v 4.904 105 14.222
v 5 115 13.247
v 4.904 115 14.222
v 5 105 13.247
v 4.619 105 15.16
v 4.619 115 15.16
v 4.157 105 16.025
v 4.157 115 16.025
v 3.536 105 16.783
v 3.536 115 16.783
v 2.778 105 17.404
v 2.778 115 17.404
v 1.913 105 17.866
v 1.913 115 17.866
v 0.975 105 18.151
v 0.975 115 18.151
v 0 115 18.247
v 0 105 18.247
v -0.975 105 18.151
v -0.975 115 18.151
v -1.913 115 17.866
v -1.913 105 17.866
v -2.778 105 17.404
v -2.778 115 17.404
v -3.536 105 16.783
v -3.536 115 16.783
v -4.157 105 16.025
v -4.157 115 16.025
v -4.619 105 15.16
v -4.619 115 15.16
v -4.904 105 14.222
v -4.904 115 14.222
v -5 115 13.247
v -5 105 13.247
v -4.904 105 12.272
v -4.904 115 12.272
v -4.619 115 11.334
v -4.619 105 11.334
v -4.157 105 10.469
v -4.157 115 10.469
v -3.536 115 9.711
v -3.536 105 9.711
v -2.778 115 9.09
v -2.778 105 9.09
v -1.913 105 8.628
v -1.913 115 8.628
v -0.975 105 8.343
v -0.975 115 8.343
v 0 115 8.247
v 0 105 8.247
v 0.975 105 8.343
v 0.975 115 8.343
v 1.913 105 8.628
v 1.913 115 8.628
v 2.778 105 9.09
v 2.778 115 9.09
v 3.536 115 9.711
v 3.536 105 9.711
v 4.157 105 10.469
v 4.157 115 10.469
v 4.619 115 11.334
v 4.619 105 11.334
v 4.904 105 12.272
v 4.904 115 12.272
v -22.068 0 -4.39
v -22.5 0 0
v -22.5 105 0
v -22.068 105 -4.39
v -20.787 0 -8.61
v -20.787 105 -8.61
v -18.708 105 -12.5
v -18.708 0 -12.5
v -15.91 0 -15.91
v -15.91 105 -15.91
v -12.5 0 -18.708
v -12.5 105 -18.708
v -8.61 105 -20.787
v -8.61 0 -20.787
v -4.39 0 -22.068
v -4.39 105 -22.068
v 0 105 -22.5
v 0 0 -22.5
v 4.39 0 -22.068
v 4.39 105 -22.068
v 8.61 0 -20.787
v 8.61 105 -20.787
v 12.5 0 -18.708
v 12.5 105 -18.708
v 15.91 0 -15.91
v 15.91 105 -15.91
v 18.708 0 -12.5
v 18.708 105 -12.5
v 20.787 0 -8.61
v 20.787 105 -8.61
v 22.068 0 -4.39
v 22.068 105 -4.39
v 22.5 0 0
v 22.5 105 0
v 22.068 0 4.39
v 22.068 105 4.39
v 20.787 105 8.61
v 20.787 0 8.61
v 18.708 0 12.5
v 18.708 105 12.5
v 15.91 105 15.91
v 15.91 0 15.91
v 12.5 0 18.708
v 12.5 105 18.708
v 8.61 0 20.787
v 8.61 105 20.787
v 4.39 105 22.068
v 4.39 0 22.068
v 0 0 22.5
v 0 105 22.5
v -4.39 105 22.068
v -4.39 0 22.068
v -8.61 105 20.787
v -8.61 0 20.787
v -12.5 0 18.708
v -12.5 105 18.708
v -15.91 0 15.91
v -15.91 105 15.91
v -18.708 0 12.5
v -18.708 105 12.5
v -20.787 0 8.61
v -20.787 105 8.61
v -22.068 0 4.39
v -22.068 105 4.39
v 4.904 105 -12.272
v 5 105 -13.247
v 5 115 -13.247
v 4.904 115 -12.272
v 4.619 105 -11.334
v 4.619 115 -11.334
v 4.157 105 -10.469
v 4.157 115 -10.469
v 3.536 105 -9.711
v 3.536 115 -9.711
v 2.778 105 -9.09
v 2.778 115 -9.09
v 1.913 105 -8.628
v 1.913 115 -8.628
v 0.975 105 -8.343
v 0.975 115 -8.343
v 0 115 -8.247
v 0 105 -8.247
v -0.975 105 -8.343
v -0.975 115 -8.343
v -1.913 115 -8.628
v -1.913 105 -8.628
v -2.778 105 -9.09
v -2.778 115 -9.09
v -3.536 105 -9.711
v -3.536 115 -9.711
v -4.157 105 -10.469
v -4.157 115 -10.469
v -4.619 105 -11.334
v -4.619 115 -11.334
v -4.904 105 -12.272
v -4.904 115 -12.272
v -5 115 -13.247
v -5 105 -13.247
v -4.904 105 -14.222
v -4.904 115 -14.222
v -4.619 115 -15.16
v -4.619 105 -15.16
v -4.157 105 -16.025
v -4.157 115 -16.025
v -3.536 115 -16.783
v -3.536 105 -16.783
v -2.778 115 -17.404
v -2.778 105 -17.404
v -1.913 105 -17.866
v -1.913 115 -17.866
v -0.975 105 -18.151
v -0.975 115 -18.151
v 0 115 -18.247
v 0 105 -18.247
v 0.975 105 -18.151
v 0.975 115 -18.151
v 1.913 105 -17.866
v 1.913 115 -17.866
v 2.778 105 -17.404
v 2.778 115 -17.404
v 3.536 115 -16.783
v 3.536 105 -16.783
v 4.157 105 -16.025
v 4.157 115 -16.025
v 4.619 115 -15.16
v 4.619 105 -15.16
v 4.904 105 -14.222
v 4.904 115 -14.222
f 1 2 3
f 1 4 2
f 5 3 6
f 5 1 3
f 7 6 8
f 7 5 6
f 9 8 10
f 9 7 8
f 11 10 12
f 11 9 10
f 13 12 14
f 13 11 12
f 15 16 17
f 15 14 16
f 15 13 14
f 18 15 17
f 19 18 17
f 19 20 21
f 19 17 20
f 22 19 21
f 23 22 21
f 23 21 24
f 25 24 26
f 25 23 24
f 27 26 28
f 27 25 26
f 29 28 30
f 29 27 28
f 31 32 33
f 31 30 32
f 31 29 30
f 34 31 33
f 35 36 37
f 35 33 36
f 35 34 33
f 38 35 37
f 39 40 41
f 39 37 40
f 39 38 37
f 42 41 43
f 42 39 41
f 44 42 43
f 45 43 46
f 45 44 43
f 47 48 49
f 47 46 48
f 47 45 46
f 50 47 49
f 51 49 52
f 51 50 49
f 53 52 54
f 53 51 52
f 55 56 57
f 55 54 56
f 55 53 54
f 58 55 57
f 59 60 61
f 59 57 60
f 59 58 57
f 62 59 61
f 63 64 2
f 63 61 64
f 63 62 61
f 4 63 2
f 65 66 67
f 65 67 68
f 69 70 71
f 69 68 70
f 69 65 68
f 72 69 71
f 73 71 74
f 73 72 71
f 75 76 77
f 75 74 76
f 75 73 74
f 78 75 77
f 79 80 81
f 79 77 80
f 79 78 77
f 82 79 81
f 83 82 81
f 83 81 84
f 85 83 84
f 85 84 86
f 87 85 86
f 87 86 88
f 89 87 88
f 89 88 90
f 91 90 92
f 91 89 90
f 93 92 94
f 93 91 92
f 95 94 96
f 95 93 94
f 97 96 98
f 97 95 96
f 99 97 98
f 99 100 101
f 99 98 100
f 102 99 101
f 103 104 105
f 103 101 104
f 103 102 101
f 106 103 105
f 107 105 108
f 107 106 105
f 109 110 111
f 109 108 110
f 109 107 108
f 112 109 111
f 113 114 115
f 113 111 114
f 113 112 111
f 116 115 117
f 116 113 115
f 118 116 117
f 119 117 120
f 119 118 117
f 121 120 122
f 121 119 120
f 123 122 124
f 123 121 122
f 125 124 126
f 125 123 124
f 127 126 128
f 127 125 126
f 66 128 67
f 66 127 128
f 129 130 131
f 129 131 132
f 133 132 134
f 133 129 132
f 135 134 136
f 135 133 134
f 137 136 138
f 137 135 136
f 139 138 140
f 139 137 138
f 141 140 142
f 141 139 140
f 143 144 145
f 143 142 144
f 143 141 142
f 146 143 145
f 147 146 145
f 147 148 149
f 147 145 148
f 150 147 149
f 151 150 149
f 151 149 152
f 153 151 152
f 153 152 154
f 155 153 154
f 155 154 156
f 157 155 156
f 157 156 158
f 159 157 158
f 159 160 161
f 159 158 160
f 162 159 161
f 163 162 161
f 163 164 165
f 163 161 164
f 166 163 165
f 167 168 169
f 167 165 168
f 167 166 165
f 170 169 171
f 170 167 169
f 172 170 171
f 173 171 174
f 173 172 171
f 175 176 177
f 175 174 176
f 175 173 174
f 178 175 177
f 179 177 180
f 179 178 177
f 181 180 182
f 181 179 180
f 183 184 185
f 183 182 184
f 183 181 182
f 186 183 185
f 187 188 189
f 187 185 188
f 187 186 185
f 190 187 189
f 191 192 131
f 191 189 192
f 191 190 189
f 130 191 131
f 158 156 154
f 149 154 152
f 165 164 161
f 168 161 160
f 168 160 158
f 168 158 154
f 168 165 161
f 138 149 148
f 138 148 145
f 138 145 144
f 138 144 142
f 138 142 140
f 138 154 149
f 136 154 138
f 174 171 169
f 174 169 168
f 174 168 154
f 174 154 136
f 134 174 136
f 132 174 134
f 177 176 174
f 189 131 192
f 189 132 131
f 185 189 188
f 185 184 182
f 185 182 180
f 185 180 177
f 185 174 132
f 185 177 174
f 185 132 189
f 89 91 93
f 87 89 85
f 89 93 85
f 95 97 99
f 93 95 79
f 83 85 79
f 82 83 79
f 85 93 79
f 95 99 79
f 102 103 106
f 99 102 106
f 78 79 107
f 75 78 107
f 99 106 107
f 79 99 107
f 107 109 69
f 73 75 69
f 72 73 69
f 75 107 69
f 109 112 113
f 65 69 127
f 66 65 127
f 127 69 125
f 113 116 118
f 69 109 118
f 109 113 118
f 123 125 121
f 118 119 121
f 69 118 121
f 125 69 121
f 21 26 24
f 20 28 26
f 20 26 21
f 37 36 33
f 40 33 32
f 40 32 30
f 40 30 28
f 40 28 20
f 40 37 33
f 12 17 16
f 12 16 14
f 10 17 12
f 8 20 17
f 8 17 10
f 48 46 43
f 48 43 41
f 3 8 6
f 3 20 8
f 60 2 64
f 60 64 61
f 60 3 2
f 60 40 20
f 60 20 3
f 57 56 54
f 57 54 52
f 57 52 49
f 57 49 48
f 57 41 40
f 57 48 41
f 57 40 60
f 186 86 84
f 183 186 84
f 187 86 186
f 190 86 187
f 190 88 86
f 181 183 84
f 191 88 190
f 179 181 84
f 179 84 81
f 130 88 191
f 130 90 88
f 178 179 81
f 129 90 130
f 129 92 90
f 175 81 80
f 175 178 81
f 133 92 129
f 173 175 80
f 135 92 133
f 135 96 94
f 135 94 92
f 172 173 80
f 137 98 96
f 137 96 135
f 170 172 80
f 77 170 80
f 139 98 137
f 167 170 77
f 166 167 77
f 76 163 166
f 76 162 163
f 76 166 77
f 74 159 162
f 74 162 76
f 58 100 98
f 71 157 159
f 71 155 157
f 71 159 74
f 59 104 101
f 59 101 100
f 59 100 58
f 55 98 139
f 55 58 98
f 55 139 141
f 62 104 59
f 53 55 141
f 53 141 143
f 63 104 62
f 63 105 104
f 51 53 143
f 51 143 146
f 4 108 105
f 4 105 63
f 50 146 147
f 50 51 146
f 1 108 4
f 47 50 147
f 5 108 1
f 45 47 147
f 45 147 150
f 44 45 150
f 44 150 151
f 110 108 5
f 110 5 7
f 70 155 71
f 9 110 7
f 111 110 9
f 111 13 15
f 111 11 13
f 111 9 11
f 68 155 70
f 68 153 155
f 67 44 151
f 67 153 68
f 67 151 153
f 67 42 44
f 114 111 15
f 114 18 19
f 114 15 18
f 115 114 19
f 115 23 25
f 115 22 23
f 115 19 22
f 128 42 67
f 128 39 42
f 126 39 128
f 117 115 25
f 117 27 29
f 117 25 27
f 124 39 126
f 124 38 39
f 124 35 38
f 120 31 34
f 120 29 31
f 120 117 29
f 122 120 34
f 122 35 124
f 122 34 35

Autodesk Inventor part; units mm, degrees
ref_plane "YZ Plane" through (0, 0, 0) normal (1, 0, 0) x (0, 1, 0)
ref_plane "XZ Plane" through (0, 0, 0) normal (0, 1, 0) x (-1, 0, 0)
ref_plane "XY Plane" through (0, 0, 0) normal (0, 0, 1) x (1, 0, 0)
sketch "Sketch1" plane through (0, 0, 0) normal (0, 1, 0) x (-1, 0, 0)
  circle A0 centre (0, 0) radius 22.5
  point P0 (0, -22.5)
  dimension "d0" = 45
extrude "Extrusion1" add sketch "Sketch1" along normal blind 105
sketch "Sketch2" plane through (0, 105, 0) normal (0, 1, 0) x (1, 0, 0)
  circle A0 centre (0, -13.247) radius 5
  circle A1 centre (0, 13.247) radius 5
  point P0 (0, 0)
  dimension "d3" = 10
  dimension "d4" = 10
  dimension "d5" = 13.247
  dimension "d6" = 13.247
extrude "Extrusion2" add sketch "Sketch2" along normal blind 10
equation "\"d6\" = d5"
properties part number "capacitor"
